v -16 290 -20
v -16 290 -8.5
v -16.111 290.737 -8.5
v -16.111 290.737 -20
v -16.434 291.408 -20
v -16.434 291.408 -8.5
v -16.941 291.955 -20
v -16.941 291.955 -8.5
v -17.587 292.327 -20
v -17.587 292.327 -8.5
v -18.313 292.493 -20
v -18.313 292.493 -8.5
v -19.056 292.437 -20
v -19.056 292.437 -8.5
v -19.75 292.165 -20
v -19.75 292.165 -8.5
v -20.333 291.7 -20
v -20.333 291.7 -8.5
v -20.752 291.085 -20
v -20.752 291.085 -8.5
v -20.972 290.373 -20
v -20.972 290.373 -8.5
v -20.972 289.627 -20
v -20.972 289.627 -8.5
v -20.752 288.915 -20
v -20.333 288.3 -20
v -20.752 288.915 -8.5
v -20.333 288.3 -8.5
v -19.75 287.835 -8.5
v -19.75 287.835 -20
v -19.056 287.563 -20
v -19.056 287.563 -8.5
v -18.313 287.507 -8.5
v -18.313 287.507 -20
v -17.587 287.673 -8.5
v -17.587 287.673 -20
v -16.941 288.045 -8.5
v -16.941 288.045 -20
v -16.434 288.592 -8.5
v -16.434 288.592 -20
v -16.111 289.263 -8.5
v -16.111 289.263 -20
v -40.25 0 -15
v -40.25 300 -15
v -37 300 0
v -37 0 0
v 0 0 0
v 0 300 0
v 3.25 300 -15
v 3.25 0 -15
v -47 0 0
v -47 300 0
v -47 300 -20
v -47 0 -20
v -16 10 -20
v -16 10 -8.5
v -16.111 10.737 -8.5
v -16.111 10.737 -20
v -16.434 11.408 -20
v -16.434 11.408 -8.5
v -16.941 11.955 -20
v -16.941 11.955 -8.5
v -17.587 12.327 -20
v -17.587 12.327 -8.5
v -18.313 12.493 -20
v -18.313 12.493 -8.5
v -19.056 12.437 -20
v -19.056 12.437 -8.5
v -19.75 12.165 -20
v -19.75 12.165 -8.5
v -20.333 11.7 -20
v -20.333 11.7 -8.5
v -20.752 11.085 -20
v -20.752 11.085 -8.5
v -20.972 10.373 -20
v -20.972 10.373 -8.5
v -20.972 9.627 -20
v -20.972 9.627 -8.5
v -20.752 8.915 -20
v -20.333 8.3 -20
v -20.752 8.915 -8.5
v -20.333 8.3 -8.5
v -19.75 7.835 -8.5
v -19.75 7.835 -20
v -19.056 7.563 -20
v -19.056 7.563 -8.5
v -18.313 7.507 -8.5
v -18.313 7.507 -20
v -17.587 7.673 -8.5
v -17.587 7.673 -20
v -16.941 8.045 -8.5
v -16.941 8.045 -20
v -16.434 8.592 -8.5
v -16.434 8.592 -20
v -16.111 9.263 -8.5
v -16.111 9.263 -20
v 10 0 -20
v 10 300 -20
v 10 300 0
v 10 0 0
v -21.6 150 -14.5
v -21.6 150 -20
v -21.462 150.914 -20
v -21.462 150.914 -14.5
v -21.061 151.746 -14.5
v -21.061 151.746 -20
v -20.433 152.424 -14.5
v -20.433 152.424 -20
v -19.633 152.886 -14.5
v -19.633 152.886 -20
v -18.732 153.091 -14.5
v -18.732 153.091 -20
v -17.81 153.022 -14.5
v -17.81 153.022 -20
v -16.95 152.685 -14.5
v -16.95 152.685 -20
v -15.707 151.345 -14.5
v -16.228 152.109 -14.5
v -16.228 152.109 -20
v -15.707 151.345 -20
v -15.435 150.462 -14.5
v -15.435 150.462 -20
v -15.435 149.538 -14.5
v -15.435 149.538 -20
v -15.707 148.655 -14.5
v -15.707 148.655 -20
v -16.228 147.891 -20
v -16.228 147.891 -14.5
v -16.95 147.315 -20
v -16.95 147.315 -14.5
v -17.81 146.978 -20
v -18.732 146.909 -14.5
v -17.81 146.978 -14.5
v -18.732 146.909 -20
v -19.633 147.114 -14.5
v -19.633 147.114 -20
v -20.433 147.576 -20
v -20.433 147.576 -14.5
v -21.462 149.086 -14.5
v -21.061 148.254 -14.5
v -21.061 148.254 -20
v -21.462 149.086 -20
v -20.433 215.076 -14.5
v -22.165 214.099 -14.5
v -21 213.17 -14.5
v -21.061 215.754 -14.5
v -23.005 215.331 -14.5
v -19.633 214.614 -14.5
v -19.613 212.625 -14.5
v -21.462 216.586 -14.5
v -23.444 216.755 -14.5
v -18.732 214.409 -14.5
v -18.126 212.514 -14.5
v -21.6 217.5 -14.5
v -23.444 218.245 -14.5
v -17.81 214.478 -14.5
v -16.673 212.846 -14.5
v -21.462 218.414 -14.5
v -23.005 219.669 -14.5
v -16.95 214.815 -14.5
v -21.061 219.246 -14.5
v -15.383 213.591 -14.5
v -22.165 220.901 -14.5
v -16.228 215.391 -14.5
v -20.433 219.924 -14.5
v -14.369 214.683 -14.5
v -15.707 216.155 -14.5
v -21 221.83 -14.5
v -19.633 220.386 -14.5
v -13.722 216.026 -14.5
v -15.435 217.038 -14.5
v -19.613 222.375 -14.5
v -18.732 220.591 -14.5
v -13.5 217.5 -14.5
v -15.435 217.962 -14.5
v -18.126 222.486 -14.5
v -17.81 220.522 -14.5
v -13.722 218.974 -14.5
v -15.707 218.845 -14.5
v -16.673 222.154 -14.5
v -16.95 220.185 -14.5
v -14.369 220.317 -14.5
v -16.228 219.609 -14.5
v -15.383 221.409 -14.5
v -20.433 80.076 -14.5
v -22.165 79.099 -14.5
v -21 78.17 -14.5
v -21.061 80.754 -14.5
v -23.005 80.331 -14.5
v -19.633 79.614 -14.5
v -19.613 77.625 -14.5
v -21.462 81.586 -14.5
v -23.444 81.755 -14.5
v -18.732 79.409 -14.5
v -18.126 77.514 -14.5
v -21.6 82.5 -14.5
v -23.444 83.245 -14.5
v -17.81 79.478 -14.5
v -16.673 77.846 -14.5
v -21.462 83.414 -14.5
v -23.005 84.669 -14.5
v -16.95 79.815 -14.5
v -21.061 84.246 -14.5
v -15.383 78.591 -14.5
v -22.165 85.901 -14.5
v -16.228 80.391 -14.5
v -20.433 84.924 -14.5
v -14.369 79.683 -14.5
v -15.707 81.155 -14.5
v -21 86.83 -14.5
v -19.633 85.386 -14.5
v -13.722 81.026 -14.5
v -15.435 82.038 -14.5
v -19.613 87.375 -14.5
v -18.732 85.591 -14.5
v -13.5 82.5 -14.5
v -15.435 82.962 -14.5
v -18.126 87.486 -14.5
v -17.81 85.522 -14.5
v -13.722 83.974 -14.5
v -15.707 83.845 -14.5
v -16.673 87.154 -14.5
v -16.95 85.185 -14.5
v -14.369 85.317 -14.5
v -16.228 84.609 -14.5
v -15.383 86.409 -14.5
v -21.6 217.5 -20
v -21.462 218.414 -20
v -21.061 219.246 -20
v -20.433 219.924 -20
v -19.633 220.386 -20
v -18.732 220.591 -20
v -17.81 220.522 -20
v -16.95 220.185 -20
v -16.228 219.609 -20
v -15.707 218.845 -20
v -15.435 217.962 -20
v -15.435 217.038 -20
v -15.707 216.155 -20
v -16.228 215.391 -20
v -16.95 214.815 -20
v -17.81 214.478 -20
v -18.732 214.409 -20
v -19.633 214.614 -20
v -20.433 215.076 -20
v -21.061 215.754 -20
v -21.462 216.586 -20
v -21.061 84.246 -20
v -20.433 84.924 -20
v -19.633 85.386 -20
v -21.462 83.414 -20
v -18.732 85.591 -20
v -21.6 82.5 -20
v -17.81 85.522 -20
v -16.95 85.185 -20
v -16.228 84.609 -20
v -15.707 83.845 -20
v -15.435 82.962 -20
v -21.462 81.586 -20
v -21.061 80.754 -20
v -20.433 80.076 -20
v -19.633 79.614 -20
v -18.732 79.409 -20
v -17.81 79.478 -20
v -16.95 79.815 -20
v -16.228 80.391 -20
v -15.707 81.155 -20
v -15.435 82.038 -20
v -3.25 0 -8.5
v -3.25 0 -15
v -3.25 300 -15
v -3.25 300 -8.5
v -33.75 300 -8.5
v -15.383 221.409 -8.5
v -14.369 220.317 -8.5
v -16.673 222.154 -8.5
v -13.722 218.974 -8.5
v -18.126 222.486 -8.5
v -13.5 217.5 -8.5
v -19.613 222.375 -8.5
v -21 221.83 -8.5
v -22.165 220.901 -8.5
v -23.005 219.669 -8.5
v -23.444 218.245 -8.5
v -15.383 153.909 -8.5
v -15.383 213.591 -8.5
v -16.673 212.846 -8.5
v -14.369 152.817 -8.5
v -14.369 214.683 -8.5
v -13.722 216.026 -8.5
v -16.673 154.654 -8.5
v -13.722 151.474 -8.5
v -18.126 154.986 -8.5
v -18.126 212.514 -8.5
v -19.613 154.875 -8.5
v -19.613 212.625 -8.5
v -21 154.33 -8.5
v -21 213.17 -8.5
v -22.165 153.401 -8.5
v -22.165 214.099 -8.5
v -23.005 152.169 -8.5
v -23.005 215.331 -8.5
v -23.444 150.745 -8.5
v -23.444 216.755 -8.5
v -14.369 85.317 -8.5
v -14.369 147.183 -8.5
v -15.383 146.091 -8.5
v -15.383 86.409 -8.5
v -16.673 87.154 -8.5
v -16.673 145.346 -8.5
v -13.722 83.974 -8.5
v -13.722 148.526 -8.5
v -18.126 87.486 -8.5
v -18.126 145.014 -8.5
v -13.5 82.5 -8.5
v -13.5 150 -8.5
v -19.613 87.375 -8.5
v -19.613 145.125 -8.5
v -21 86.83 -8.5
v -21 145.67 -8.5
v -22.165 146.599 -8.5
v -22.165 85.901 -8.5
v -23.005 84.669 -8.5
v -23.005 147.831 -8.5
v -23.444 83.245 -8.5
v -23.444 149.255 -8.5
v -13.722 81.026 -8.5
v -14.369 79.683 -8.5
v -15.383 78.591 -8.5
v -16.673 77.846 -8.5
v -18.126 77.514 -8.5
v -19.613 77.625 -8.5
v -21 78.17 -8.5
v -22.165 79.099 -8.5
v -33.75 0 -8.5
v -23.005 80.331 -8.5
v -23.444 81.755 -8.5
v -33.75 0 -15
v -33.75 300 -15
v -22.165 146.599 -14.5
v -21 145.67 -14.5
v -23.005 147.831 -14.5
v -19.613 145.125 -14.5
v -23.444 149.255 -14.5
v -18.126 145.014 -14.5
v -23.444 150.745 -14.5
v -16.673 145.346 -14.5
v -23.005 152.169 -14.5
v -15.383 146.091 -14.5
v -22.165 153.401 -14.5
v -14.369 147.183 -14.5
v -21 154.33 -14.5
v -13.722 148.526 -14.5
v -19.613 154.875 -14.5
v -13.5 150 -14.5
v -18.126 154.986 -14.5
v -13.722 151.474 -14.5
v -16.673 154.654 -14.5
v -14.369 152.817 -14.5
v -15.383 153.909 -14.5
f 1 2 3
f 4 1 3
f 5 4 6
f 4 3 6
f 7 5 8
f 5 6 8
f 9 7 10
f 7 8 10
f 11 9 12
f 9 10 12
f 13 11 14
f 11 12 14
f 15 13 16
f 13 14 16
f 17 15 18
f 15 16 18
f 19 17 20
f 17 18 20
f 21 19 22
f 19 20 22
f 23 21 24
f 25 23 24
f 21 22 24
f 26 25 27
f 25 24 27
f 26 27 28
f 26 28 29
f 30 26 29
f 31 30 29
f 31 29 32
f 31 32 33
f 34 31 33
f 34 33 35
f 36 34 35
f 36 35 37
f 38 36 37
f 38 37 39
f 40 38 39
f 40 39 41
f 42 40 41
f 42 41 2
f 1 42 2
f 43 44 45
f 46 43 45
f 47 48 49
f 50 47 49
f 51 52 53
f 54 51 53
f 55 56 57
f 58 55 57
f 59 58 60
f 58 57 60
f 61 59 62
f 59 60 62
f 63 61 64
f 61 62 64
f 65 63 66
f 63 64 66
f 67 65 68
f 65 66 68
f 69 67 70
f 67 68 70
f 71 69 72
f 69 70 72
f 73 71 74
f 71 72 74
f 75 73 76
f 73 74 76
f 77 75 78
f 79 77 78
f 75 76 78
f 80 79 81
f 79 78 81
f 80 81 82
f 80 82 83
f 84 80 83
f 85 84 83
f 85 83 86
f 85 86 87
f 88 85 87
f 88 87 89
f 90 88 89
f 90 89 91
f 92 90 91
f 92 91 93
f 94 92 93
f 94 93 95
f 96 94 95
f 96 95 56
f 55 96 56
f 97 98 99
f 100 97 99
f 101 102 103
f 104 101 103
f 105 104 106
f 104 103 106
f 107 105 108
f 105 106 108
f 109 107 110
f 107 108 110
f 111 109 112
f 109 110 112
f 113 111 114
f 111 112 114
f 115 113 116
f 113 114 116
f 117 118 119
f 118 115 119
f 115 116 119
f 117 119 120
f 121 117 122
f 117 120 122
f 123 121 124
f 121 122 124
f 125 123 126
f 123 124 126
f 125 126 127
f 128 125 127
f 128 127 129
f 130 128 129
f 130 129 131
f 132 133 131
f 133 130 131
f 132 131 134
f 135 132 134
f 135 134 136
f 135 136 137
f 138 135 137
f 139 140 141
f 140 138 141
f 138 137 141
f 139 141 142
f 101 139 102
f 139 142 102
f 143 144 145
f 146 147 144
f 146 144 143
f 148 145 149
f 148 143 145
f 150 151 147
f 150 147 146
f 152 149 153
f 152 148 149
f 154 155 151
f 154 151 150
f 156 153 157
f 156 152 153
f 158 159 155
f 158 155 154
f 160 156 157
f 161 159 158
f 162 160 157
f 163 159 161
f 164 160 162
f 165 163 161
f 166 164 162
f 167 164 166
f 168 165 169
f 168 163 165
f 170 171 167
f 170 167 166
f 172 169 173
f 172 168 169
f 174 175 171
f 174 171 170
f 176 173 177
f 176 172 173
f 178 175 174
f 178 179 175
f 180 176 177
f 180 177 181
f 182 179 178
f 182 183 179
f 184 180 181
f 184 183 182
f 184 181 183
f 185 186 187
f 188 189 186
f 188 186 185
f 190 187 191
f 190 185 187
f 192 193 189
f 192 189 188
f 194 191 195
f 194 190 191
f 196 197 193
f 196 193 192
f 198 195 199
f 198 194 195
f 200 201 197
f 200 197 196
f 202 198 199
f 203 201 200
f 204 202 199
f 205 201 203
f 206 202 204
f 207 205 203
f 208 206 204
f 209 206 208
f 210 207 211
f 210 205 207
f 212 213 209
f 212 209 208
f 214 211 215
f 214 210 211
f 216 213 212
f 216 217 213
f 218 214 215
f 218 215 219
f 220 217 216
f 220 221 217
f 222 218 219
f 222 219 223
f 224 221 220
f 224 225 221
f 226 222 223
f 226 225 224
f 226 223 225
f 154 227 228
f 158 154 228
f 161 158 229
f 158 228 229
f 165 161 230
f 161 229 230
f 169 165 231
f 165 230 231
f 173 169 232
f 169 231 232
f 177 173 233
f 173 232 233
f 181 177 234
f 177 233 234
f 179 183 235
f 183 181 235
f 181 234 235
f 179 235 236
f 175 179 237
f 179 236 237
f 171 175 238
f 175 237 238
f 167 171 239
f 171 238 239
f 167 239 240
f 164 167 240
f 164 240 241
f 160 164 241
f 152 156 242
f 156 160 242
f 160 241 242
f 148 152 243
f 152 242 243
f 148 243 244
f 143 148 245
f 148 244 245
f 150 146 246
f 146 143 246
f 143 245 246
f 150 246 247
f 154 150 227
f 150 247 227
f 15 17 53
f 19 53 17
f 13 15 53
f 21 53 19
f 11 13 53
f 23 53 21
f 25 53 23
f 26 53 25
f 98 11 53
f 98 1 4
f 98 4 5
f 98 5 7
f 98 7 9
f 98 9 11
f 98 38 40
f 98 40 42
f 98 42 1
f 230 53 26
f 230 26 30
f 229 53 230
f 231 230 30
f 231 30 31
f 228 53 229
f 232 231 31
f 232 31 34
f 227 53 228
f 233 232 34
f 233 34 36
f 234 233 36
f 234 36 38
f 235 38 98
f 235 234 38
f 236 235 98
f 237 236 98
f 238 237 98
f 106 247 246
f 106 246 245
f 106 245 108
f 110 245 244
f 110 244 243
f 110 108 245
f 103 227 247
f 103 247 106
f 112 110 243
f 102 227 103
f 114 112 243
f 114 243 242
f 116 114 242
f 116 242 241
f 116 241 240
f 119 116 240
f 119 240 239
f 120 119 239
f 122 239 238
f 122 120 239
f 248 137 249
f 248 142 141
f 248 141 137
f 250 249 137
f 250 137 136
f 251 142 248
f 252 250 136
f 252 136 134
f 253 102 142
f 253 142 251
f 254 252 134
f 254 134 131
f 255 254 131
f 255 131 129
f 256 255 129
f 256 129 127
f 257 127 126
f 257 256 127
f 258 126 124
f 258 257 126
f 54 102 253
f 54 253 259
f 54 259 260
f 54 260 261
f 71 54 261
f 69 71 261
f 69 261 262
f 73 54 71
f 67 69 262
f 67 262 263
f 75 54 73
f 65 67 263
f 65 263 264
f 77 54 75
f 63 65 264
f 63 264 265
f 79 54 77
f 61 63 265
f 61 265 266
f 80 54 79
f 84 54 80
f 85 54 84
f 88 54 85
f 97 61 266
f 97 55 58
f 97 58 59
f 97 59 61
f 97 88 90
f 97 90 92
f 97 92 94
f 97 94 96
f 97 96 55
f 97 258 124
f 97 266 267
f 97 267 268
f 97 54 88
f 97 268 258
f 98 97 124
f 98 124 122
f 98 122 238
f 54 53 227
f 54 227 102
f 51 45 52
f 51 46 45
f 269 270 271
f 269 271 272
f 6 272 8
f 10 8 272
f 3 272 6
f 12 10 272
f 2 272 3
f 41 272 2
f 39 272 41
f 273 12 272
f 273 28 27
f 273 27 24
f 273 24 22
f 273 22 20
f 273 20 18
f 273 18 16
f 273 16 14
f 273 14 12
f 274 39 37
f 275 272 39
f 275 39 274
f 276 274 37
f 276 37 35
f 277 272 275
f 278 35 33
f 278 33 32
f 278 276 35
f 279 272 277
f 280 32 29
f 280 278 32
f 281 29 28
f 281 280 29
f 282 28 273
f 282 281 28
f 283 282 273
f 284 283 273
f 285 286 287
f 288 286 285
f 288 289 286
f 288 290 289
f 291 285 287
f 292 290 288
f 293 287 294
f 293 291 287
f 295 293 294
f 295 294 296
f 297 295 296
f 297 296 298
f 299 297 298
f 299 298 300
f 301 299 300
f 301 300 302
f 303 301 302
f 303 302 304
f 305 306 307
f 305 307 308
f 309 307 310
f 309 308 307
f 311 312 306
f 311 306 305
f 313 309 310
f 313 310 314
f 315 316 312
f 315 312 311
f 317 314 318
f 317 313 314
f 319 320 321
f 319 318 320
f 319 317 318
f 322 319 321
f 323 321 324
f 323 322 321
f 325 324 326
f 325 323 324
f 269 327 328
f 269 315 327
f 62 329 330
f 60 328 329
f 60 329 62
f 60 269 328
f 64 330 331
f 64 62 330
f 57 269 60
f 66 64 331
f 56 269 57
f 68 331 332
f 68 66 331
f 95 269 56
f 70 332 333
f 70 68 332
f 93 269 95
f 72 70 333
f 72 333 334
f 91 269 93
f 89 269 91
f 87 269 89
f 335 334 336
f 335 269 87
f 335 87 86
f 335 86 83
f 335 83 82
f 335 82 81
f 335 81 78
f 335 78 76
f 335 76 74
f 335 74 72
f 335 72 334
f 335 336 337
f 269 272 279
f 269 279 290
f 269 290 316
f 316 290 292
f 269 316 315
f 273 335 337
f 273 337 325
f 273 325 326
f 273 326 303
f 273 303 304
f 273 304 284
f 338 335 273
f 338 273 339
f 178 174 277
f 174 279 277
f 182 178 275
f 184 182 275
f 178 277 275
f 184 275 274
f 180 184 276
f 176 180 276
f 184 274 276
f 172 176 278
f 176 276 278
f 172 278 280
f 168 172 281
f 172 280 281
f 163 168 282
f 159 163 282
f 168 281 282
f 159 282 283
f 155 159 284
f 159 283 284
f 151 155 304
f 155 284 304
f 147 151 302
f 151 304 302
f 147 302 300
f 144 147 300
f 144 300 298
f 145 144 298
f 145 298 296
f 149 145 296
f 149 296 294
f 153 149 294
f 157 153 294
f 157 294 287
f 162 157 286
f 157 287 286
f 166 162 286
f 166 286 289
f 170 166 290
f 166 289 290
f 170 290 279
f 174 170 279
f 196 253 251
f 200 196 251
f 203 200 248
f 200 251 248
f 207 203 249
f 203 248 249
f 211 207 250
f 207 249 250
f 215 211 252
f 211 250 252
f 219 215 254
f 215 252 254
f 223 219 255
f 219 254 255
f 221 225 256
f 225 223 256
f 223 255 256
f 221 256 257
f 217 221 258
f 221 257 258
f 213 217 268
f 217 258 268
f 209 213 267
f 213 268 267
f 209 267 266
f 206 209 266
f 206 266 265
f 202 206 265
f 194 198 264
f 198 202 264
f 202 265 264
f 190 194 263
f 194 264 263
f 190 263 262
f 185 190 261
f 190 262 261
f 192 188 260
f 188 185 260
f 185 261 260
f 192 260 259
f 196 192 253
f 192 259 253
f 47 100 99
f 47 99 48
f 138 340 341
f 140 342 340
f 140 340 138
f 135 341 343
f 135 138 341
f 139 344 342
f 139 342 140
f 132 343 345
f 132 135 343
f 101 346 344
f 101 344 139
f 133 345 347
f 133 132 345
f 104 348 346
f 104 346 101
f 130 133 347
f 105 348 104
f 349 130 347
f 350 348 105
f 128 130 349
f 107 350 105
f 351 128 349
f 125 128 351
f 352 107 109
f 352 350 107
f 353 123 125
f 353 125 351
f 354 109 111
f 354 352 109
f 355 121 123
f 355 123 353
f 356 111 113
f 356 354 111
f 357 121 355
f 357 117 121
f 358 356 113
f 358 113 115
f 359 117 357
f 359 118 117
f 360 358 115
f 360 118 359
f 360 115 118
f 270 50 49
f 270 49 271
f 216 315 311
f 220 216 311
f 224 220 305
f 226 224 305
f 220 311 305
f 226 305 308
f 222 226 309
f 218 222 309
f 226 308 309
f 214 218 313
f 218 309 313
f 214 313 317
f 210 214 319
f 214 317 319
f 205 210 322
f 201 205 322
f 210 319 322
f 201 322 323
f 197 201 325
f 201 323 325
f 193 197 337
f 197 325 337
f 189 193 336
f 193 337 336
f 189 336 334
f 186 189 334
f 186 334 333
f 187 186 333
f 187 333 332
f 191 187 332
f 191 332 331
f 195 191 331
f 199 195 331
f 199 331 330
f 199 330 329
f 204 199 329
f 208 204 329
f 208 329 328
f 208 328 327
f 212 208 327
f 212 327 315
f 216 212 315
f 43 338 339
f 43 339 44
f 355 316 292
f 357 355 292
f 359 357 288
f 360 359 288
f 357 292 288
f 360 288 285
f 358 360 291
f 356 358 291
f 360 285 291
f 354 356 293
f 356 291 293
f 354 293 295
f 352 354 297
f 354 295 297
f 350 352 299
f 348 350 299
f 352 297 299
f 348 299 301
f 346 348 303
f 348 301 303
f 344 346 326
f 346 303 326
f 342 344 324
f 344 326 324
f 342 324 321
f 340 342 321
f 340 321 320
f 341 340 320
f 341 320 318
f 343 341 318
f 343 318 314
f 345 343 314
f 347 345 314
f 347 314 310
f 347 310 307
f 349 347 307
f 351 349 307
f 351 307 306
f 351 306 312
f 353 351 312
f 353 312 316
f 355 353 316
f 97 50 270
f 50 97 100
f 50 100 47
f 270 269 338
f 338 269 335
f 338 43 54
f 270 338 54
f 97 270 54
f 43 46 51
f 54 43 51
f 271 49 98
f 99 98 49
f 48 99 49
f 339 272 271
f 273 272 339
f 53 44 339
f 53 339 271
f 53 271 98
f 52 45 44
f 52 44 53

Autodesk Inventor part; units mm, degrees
ref_plane "YZ Plane" through (0, 0, 0) normal (1, 0, 0) x (0, 1, 0)
ref_plane "XZ Plane" through (0, 0, 0) normal (0, 1, 0) x (-1, 0, 0)
ref_plane "XY Plane" through (0, 0, 0) normal (0, 0, 1) x (1, 0, 0)
sketch "Sketch1" plane through (0, 0, 0) normal (0, 1, 0) x (-1, 0, 0)
  line L0 (37, 0) -> (0, 0)
  line L1 (0, 0) -> (-3.25, -15)
  line L2 (-3.25, -15) -> (3.25, -15)
  line L3 (3.25, -15) -> (3.25, -8.5)
  line L4 (3.25, -8.5) -> (33.75, -8.5)
  line L5 (33.75, -8.5) -> (33.75, -15)
  line L6 (33.75, -15) -> (40.25, -15)
  line L7 (40.25, -15) -> (37, 0)
  line L8 (37, 0) -> (47, 0)
  line L9 (47, 0) -> (47, -20)
  line L10 (47, -20) -> (-10, -20)
  line L11 (-10, -20) -> (-10, 0)
  line L12 (-10, 0) -> (0, 0)
  dimension "d1" = 20
  dimension "d5" = 10
  dimension "d6" = 10
extrude "Extrusion1" add sketch "Sketch1" along normal blind 300 contours L8 L9 L10 L11 L12 L1 L2 L3 L4 L5 L6 L7
sketch "Sketch2" plane through (10, 0, -20) normal (0, 0, -1) x (-1, 0, 0)
  line L0 (0, 0) -> (57, 0) projected
  line L1 (57, 0) -> (57, 300) projected
  line L2 (0, 300) -> (57, 300) projected
  line L3 (0, 0) -> (0, 300) projected
  line L4 (43.75, 0) -> (13.25, 0) projected
  line L5 (28.5, 0) -> (28.5, 300)
  line L6 (43.75, 300) -> (13.25, 300) projected
  line L7 (0, 52.5) -> (57, 52.5)
  line L8 (57, 52.5) -> (57, 247.5)
  line L9 (57, 247.5) -> (0, 247.5)
  line L10 (0, 247.5) -> (0, 52.5)
  line L11 (0, 52.5) -> (57, 247.5) construction
  line L12 (57, 52.5) -> (0, 247.5) construction
  circle A0 centre (28.5, 150) radius 3.1
  line L13 (28.5, 52.5) -> (28.5, 82.5)
  circle A1 centre (28.5, 82.5) radius 3.1
  line L14 (28.5, 247.5) -> (28.5, 217.5)
  circle A2 centre (28.5, 217.5) radius 3.1
  point P0 (10, 0)
  dimension "d7" = 195
  dimension "d8" = 6.2
  dimension "d9" = 30
  dimension "d10" = 6.2
  dimension "d11" = 30
  dimension "d12" = 6.2
extrude "Extrusion2" cut sketch "Sketch2" against normal up to surface (11.5 mm away) contours A1 L5 | L5 A1 | A2 L5 | L5 A2 | A0 L5 | L5 A0
sketch "Sketch4" plane through (-33.75, 0, -8.5) normal (0, 0, 1) x (1, 0, 0)
  circle A0 centre (15.25, 217.5) radius 3.1 projected
  circle A1 centre (15.25, 82.5) radius 3.1 projected
  circle A2 centre (15.25, 150) radius 3.1 projected
  line L0 (0, 0) -> (30.5, 0) projected
  line L1 (30.5, 0) -> (30.5, 300) projected
  line L2 (0, 300) -> (30.5, 300) projected
  line L3 (0, 0) -> (0, 300) projected
  circle A3 centre (15.25, 82.5) radius 3.1 projected
  circle A4 centre (15.25, 82.5) radius 5
  circle A5 centre (15.25, 150) radius 5
  circle A6 centre (15.25, 217.5) radius 5
  point P0 (33.75, 0)
  dimension "d15" = 10
  dimension "d16" = 10
  dimension "d17" = 10
extrude "Extrusion3" cut sketch "Sketch4" against normal blind 6 contours A4 | A5 | A6
sketch "Sketch5" plane through (-33.75, 0, -8.5) normal (0, 0, 1) x (1, 0, 0)
  line L0 (43.75, 0) -> (-13.25, 0) projected
  line L1 (15.25, 0) -> (15.25, 10)
  line L2 (43.75, 300) -> (-13.25, 300) projected
  line L3 (15.25, 300) -> (15.25, 290)
  circle A0 centre (15.25, 290) radius 2.5
  circle A1 centre (15.25, 10) radius 2.5
  point P0 (33.75, 0)
  dimension "d20" = 10
  dimension "d21" = 10
  dimension "d22" = 5
  dimension "d23" = 5
extrude "Extrusion4" cut sketch "Sketch5" against normal up to surface (11.5 mm away)
thread "Thread1" size "M5x0.8" class "6H" standard "ANSI Metric M Profile" full length
thread "Thread2" size "M5x0.8" class "6H" standard "ANSI Metric M Profile" full length
properties part number "uchwyt_szyny" material "Aluminum 6061"
